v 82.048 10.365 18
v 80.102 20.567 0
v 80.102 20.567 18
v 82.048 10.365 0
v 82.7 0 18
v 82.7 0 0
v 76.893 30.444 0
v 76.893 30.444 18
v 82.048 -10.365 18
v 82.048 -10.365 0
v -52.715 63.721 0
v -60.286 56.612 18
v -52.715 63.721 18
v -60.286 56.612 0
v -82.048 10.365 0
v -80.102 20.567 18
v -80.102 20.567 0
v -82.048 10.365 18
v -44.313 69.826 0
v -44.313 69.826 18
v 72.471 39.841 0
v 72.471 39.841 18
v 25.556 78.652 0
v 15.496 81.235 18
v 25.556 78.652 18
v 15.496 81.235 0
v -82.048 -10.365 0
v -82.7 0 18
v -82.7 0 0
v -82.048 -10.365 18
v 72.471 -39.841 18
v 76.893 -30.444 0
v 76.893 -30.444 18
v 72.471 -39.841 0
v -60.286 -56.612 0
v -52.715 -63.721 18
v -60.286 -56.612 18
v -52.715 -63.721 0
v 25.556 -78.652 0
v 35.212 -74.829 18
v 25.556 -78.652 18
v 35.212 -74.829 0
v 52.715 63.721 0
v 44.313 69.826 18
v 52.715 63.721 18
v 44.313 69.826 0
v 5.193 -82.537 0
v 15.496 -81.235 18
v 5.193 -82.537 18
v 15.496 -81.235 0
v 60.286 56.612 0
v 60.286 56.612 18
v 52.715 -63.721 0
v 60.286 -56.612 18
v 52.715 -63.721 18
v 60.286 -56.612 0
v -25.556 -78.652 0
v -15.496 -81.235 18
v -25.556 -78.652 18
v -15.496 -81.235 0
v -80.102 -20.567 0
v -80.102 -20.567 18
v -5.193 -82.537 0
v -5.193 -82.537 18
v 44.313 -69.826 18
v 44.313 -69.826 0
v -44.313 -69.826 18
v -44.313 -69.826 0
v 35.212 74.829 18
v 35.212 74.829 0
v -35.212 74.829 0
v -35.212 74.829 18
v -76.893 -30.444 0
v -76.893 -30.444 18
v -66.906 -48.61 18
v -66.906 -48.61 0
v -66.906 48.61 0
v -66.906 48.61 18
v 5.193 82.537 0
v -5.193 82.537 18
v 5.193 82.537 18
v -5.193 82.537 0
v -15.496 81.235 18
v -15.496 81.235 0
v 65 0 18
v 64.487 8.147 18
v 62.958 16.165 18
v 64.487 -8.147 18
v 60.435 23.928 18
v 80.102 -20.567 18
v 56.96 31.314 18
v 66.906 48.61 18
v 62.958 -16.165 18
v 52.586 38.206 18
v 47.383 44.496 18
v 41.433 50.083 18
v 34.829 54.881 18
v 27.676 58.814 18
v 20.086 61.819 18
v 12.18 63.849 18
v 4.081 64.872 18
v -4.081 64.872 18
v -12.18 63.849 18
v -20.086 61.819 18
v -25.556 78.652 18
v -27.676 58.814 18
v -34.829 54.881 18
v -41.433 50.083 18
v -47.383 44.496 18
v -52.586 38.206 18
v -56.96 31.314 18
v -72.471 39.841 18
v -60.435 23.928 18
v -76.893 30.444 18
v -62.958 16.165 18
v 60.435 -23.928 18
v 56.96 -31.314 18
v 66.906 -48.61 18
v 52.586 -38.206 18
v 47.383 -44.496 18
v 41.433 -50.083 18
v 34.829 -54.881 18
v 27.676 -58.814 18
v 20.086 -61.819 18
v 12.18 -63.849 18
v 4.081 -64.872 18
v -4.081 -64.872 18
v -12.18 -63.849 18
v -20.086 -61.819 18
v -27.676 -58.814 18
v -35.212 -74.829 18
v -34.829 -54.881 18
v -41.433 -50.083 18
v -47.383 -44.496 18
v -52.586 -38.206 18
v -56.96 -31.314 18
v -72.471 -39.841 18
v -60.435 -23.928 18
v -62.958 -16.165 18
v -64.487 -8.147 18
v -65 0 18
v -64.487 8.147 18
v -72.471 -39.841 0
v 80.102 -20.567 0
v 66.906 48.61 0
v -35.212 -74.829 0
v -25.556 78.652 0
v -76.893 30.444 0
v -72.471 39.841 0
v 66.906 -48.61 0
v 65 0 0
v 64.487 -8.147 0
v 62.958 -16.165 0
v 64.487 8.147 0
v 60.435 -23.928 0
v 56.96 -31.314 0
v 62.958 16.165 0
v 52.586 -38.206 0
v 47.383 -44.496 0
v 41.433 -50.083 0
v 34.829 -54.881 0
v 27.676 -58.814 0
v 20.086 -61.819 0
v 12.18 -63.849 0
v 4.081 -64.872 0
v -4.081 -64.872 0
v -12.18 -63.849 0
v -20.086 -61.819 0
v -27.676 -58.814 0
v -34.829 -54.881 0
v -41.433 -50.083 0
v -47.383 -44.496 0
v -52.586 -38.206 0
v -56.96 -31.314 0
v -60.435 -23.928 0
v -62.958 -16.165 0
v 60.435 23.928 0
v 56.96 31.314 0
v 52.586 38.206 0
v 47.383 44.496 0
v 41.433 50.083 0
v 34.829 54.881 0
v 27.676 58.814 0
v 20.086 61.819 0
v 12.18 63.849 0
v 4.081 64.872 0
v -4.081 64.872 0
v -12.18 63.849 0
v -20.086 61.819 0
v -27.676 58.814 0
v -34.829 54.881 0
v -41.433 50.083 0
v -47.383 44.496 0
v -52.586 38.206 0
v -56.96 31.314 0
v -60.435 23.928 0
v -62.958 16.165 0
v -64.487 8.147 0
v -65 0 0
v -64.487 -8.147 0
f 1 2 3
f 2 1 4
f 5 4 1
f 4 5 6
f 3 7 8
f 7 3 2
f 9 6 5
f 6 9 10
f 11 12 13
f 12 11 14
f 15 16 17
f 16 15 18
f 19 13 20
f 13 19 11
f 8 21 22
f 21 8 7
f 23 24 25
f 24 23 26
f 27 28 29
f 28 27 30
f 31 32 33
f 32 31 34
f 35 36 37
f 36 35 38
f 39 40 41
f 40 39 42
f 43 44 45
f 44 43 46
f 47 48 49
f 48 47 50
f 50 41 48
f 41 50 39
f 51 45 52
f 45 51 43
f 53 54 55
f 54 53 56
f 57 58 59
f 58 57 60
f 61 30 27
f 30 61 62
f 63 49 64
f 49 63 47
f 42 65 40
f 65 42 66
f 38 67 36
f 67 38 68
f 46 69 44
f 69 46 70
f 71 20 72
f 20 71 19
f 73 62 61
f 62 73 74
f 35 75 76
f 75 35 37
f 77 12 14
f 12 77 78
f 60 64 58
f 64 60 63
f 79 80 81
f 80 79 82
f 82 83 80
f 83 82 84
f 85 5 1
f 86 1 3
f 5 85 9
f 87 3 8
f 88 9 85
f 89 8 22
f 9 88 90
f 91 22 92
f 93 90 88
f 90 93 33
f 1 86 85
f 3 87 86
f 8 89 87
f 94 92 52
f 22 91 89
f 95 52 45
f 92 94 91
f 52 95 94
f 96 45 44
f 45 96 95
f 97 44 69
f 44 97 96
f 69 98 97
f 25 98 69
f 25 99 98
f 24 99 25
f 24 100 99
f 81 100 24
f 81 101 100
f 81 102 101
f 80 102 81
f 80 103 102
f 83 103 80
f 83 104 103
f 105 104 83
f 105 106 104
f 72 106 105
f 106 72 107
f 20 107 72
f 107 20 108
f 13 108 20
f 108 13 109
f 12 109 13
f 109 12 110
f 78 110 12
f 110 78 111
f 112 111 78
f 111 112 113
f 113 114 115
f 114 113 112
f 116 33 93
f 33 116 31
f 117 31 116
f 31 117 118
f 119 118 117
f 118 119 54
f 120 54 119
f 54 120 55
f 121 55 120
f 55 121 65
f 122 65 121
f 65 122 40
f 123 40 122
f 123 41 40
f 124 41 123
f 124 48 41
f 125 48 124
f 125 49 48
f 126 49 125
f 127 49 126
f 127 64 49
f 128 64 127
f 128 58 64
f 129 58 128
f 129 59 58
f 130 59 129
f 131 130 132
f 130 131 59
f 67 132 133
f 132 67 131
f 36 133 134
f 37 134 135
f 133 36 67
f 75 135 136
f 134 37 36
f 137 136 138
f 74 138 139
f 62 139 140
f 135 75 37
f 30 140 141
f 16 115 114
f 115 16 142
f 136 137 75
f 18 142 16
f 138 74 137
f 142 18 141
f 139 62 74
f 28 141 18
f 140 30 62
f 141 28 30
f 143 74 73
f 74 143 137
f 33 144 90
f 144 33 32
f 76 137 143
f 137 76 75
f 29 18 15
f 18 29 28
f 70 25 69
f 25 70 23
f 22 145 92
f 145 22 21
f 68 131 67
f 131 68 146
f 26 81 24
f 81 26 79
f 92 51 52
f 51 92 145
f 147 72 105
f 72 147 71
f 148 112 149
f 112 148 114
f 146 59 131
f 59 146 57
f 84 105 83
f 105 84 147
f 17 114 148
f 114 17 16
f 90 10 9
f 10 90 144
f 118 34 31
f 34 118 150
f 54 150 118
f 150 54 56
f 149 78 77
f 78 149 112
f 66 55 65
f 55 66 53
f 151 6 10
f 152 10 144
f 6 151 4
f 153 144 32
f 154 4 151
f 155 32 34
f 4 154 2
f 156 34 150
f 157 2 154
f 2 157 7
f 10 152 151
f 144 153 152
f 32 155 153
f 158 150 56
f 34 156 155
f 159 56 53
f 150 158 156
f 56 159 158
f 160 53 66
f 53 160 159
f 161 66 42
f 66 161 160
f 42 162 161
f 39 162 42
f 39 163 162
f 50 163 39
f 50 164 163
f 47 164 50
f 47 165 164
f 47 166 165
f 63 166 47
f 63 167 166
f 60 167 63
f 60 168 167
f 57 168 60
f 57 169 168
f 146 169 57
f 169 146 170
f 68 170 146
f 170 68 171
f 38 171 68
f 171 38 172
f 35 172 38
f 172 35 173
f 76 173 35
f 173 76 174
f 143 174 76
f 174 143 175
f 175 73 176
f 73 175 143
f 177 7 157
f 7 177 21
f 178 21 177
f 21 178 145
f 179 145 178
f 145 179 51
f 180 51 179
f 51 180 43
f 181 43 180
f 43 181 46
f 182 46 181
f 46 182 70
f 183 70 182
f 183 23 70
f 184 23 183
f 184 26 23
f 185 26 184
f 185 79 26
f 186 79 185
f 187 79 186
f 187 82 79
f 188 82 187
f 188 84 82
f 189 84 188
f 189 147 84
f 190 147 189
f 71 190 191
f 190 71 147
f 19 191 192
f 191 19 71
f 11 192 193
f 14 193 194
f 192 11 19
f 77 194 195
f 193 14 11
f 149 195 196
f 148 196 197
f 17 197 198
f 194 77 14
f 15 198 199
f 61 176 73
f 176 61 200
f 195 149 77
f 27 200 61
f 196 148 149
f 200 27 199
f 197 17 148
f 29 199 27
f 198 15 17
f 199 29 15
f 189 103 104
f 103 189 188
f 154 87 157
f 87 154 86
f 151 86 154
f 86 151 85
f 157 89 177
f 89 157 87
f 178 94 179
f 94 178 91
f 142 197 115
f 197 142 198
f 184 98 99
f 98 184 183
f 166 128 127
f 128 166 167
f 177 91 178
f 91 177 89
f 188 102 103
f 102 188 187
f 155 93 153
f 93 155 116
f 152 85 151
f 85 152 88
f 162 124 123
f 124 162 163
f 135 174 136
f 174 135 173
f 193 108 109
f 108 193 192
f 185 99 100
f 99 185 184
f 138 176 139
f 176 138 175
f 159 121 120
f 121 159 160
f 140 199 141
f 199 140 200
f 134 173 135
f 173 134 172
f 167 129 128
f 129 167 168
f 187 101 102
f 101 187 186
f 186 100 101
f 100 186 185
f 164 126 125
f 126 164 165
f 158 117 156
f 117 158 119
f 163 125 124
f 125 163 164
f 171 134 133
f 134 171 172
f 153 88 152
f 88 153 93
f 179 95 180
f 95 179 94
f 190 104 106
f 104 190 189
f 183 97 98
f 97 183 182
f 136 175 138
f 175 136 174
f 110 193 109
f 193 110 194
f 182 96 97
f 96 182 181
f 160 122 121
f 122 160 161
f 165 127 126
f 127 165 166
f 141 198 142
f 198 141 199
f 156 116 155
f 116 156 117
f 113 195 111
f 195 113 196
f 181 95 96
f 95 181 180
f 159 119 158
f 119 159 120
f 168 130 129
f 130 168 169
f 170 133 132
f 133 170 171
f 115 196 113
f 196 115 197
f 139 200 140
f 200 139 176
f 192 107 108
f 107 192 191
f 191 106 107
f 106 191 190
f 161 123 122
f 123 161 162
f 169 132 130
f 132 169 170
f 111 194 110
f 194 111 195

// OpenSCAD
$fn = 50;


difference() {
	union() {
		cylinder(h = 18, r = 82.7000000000);
	}
	union() {
		cylinder(h = 18, r = 65.0000000000);
	}
}
